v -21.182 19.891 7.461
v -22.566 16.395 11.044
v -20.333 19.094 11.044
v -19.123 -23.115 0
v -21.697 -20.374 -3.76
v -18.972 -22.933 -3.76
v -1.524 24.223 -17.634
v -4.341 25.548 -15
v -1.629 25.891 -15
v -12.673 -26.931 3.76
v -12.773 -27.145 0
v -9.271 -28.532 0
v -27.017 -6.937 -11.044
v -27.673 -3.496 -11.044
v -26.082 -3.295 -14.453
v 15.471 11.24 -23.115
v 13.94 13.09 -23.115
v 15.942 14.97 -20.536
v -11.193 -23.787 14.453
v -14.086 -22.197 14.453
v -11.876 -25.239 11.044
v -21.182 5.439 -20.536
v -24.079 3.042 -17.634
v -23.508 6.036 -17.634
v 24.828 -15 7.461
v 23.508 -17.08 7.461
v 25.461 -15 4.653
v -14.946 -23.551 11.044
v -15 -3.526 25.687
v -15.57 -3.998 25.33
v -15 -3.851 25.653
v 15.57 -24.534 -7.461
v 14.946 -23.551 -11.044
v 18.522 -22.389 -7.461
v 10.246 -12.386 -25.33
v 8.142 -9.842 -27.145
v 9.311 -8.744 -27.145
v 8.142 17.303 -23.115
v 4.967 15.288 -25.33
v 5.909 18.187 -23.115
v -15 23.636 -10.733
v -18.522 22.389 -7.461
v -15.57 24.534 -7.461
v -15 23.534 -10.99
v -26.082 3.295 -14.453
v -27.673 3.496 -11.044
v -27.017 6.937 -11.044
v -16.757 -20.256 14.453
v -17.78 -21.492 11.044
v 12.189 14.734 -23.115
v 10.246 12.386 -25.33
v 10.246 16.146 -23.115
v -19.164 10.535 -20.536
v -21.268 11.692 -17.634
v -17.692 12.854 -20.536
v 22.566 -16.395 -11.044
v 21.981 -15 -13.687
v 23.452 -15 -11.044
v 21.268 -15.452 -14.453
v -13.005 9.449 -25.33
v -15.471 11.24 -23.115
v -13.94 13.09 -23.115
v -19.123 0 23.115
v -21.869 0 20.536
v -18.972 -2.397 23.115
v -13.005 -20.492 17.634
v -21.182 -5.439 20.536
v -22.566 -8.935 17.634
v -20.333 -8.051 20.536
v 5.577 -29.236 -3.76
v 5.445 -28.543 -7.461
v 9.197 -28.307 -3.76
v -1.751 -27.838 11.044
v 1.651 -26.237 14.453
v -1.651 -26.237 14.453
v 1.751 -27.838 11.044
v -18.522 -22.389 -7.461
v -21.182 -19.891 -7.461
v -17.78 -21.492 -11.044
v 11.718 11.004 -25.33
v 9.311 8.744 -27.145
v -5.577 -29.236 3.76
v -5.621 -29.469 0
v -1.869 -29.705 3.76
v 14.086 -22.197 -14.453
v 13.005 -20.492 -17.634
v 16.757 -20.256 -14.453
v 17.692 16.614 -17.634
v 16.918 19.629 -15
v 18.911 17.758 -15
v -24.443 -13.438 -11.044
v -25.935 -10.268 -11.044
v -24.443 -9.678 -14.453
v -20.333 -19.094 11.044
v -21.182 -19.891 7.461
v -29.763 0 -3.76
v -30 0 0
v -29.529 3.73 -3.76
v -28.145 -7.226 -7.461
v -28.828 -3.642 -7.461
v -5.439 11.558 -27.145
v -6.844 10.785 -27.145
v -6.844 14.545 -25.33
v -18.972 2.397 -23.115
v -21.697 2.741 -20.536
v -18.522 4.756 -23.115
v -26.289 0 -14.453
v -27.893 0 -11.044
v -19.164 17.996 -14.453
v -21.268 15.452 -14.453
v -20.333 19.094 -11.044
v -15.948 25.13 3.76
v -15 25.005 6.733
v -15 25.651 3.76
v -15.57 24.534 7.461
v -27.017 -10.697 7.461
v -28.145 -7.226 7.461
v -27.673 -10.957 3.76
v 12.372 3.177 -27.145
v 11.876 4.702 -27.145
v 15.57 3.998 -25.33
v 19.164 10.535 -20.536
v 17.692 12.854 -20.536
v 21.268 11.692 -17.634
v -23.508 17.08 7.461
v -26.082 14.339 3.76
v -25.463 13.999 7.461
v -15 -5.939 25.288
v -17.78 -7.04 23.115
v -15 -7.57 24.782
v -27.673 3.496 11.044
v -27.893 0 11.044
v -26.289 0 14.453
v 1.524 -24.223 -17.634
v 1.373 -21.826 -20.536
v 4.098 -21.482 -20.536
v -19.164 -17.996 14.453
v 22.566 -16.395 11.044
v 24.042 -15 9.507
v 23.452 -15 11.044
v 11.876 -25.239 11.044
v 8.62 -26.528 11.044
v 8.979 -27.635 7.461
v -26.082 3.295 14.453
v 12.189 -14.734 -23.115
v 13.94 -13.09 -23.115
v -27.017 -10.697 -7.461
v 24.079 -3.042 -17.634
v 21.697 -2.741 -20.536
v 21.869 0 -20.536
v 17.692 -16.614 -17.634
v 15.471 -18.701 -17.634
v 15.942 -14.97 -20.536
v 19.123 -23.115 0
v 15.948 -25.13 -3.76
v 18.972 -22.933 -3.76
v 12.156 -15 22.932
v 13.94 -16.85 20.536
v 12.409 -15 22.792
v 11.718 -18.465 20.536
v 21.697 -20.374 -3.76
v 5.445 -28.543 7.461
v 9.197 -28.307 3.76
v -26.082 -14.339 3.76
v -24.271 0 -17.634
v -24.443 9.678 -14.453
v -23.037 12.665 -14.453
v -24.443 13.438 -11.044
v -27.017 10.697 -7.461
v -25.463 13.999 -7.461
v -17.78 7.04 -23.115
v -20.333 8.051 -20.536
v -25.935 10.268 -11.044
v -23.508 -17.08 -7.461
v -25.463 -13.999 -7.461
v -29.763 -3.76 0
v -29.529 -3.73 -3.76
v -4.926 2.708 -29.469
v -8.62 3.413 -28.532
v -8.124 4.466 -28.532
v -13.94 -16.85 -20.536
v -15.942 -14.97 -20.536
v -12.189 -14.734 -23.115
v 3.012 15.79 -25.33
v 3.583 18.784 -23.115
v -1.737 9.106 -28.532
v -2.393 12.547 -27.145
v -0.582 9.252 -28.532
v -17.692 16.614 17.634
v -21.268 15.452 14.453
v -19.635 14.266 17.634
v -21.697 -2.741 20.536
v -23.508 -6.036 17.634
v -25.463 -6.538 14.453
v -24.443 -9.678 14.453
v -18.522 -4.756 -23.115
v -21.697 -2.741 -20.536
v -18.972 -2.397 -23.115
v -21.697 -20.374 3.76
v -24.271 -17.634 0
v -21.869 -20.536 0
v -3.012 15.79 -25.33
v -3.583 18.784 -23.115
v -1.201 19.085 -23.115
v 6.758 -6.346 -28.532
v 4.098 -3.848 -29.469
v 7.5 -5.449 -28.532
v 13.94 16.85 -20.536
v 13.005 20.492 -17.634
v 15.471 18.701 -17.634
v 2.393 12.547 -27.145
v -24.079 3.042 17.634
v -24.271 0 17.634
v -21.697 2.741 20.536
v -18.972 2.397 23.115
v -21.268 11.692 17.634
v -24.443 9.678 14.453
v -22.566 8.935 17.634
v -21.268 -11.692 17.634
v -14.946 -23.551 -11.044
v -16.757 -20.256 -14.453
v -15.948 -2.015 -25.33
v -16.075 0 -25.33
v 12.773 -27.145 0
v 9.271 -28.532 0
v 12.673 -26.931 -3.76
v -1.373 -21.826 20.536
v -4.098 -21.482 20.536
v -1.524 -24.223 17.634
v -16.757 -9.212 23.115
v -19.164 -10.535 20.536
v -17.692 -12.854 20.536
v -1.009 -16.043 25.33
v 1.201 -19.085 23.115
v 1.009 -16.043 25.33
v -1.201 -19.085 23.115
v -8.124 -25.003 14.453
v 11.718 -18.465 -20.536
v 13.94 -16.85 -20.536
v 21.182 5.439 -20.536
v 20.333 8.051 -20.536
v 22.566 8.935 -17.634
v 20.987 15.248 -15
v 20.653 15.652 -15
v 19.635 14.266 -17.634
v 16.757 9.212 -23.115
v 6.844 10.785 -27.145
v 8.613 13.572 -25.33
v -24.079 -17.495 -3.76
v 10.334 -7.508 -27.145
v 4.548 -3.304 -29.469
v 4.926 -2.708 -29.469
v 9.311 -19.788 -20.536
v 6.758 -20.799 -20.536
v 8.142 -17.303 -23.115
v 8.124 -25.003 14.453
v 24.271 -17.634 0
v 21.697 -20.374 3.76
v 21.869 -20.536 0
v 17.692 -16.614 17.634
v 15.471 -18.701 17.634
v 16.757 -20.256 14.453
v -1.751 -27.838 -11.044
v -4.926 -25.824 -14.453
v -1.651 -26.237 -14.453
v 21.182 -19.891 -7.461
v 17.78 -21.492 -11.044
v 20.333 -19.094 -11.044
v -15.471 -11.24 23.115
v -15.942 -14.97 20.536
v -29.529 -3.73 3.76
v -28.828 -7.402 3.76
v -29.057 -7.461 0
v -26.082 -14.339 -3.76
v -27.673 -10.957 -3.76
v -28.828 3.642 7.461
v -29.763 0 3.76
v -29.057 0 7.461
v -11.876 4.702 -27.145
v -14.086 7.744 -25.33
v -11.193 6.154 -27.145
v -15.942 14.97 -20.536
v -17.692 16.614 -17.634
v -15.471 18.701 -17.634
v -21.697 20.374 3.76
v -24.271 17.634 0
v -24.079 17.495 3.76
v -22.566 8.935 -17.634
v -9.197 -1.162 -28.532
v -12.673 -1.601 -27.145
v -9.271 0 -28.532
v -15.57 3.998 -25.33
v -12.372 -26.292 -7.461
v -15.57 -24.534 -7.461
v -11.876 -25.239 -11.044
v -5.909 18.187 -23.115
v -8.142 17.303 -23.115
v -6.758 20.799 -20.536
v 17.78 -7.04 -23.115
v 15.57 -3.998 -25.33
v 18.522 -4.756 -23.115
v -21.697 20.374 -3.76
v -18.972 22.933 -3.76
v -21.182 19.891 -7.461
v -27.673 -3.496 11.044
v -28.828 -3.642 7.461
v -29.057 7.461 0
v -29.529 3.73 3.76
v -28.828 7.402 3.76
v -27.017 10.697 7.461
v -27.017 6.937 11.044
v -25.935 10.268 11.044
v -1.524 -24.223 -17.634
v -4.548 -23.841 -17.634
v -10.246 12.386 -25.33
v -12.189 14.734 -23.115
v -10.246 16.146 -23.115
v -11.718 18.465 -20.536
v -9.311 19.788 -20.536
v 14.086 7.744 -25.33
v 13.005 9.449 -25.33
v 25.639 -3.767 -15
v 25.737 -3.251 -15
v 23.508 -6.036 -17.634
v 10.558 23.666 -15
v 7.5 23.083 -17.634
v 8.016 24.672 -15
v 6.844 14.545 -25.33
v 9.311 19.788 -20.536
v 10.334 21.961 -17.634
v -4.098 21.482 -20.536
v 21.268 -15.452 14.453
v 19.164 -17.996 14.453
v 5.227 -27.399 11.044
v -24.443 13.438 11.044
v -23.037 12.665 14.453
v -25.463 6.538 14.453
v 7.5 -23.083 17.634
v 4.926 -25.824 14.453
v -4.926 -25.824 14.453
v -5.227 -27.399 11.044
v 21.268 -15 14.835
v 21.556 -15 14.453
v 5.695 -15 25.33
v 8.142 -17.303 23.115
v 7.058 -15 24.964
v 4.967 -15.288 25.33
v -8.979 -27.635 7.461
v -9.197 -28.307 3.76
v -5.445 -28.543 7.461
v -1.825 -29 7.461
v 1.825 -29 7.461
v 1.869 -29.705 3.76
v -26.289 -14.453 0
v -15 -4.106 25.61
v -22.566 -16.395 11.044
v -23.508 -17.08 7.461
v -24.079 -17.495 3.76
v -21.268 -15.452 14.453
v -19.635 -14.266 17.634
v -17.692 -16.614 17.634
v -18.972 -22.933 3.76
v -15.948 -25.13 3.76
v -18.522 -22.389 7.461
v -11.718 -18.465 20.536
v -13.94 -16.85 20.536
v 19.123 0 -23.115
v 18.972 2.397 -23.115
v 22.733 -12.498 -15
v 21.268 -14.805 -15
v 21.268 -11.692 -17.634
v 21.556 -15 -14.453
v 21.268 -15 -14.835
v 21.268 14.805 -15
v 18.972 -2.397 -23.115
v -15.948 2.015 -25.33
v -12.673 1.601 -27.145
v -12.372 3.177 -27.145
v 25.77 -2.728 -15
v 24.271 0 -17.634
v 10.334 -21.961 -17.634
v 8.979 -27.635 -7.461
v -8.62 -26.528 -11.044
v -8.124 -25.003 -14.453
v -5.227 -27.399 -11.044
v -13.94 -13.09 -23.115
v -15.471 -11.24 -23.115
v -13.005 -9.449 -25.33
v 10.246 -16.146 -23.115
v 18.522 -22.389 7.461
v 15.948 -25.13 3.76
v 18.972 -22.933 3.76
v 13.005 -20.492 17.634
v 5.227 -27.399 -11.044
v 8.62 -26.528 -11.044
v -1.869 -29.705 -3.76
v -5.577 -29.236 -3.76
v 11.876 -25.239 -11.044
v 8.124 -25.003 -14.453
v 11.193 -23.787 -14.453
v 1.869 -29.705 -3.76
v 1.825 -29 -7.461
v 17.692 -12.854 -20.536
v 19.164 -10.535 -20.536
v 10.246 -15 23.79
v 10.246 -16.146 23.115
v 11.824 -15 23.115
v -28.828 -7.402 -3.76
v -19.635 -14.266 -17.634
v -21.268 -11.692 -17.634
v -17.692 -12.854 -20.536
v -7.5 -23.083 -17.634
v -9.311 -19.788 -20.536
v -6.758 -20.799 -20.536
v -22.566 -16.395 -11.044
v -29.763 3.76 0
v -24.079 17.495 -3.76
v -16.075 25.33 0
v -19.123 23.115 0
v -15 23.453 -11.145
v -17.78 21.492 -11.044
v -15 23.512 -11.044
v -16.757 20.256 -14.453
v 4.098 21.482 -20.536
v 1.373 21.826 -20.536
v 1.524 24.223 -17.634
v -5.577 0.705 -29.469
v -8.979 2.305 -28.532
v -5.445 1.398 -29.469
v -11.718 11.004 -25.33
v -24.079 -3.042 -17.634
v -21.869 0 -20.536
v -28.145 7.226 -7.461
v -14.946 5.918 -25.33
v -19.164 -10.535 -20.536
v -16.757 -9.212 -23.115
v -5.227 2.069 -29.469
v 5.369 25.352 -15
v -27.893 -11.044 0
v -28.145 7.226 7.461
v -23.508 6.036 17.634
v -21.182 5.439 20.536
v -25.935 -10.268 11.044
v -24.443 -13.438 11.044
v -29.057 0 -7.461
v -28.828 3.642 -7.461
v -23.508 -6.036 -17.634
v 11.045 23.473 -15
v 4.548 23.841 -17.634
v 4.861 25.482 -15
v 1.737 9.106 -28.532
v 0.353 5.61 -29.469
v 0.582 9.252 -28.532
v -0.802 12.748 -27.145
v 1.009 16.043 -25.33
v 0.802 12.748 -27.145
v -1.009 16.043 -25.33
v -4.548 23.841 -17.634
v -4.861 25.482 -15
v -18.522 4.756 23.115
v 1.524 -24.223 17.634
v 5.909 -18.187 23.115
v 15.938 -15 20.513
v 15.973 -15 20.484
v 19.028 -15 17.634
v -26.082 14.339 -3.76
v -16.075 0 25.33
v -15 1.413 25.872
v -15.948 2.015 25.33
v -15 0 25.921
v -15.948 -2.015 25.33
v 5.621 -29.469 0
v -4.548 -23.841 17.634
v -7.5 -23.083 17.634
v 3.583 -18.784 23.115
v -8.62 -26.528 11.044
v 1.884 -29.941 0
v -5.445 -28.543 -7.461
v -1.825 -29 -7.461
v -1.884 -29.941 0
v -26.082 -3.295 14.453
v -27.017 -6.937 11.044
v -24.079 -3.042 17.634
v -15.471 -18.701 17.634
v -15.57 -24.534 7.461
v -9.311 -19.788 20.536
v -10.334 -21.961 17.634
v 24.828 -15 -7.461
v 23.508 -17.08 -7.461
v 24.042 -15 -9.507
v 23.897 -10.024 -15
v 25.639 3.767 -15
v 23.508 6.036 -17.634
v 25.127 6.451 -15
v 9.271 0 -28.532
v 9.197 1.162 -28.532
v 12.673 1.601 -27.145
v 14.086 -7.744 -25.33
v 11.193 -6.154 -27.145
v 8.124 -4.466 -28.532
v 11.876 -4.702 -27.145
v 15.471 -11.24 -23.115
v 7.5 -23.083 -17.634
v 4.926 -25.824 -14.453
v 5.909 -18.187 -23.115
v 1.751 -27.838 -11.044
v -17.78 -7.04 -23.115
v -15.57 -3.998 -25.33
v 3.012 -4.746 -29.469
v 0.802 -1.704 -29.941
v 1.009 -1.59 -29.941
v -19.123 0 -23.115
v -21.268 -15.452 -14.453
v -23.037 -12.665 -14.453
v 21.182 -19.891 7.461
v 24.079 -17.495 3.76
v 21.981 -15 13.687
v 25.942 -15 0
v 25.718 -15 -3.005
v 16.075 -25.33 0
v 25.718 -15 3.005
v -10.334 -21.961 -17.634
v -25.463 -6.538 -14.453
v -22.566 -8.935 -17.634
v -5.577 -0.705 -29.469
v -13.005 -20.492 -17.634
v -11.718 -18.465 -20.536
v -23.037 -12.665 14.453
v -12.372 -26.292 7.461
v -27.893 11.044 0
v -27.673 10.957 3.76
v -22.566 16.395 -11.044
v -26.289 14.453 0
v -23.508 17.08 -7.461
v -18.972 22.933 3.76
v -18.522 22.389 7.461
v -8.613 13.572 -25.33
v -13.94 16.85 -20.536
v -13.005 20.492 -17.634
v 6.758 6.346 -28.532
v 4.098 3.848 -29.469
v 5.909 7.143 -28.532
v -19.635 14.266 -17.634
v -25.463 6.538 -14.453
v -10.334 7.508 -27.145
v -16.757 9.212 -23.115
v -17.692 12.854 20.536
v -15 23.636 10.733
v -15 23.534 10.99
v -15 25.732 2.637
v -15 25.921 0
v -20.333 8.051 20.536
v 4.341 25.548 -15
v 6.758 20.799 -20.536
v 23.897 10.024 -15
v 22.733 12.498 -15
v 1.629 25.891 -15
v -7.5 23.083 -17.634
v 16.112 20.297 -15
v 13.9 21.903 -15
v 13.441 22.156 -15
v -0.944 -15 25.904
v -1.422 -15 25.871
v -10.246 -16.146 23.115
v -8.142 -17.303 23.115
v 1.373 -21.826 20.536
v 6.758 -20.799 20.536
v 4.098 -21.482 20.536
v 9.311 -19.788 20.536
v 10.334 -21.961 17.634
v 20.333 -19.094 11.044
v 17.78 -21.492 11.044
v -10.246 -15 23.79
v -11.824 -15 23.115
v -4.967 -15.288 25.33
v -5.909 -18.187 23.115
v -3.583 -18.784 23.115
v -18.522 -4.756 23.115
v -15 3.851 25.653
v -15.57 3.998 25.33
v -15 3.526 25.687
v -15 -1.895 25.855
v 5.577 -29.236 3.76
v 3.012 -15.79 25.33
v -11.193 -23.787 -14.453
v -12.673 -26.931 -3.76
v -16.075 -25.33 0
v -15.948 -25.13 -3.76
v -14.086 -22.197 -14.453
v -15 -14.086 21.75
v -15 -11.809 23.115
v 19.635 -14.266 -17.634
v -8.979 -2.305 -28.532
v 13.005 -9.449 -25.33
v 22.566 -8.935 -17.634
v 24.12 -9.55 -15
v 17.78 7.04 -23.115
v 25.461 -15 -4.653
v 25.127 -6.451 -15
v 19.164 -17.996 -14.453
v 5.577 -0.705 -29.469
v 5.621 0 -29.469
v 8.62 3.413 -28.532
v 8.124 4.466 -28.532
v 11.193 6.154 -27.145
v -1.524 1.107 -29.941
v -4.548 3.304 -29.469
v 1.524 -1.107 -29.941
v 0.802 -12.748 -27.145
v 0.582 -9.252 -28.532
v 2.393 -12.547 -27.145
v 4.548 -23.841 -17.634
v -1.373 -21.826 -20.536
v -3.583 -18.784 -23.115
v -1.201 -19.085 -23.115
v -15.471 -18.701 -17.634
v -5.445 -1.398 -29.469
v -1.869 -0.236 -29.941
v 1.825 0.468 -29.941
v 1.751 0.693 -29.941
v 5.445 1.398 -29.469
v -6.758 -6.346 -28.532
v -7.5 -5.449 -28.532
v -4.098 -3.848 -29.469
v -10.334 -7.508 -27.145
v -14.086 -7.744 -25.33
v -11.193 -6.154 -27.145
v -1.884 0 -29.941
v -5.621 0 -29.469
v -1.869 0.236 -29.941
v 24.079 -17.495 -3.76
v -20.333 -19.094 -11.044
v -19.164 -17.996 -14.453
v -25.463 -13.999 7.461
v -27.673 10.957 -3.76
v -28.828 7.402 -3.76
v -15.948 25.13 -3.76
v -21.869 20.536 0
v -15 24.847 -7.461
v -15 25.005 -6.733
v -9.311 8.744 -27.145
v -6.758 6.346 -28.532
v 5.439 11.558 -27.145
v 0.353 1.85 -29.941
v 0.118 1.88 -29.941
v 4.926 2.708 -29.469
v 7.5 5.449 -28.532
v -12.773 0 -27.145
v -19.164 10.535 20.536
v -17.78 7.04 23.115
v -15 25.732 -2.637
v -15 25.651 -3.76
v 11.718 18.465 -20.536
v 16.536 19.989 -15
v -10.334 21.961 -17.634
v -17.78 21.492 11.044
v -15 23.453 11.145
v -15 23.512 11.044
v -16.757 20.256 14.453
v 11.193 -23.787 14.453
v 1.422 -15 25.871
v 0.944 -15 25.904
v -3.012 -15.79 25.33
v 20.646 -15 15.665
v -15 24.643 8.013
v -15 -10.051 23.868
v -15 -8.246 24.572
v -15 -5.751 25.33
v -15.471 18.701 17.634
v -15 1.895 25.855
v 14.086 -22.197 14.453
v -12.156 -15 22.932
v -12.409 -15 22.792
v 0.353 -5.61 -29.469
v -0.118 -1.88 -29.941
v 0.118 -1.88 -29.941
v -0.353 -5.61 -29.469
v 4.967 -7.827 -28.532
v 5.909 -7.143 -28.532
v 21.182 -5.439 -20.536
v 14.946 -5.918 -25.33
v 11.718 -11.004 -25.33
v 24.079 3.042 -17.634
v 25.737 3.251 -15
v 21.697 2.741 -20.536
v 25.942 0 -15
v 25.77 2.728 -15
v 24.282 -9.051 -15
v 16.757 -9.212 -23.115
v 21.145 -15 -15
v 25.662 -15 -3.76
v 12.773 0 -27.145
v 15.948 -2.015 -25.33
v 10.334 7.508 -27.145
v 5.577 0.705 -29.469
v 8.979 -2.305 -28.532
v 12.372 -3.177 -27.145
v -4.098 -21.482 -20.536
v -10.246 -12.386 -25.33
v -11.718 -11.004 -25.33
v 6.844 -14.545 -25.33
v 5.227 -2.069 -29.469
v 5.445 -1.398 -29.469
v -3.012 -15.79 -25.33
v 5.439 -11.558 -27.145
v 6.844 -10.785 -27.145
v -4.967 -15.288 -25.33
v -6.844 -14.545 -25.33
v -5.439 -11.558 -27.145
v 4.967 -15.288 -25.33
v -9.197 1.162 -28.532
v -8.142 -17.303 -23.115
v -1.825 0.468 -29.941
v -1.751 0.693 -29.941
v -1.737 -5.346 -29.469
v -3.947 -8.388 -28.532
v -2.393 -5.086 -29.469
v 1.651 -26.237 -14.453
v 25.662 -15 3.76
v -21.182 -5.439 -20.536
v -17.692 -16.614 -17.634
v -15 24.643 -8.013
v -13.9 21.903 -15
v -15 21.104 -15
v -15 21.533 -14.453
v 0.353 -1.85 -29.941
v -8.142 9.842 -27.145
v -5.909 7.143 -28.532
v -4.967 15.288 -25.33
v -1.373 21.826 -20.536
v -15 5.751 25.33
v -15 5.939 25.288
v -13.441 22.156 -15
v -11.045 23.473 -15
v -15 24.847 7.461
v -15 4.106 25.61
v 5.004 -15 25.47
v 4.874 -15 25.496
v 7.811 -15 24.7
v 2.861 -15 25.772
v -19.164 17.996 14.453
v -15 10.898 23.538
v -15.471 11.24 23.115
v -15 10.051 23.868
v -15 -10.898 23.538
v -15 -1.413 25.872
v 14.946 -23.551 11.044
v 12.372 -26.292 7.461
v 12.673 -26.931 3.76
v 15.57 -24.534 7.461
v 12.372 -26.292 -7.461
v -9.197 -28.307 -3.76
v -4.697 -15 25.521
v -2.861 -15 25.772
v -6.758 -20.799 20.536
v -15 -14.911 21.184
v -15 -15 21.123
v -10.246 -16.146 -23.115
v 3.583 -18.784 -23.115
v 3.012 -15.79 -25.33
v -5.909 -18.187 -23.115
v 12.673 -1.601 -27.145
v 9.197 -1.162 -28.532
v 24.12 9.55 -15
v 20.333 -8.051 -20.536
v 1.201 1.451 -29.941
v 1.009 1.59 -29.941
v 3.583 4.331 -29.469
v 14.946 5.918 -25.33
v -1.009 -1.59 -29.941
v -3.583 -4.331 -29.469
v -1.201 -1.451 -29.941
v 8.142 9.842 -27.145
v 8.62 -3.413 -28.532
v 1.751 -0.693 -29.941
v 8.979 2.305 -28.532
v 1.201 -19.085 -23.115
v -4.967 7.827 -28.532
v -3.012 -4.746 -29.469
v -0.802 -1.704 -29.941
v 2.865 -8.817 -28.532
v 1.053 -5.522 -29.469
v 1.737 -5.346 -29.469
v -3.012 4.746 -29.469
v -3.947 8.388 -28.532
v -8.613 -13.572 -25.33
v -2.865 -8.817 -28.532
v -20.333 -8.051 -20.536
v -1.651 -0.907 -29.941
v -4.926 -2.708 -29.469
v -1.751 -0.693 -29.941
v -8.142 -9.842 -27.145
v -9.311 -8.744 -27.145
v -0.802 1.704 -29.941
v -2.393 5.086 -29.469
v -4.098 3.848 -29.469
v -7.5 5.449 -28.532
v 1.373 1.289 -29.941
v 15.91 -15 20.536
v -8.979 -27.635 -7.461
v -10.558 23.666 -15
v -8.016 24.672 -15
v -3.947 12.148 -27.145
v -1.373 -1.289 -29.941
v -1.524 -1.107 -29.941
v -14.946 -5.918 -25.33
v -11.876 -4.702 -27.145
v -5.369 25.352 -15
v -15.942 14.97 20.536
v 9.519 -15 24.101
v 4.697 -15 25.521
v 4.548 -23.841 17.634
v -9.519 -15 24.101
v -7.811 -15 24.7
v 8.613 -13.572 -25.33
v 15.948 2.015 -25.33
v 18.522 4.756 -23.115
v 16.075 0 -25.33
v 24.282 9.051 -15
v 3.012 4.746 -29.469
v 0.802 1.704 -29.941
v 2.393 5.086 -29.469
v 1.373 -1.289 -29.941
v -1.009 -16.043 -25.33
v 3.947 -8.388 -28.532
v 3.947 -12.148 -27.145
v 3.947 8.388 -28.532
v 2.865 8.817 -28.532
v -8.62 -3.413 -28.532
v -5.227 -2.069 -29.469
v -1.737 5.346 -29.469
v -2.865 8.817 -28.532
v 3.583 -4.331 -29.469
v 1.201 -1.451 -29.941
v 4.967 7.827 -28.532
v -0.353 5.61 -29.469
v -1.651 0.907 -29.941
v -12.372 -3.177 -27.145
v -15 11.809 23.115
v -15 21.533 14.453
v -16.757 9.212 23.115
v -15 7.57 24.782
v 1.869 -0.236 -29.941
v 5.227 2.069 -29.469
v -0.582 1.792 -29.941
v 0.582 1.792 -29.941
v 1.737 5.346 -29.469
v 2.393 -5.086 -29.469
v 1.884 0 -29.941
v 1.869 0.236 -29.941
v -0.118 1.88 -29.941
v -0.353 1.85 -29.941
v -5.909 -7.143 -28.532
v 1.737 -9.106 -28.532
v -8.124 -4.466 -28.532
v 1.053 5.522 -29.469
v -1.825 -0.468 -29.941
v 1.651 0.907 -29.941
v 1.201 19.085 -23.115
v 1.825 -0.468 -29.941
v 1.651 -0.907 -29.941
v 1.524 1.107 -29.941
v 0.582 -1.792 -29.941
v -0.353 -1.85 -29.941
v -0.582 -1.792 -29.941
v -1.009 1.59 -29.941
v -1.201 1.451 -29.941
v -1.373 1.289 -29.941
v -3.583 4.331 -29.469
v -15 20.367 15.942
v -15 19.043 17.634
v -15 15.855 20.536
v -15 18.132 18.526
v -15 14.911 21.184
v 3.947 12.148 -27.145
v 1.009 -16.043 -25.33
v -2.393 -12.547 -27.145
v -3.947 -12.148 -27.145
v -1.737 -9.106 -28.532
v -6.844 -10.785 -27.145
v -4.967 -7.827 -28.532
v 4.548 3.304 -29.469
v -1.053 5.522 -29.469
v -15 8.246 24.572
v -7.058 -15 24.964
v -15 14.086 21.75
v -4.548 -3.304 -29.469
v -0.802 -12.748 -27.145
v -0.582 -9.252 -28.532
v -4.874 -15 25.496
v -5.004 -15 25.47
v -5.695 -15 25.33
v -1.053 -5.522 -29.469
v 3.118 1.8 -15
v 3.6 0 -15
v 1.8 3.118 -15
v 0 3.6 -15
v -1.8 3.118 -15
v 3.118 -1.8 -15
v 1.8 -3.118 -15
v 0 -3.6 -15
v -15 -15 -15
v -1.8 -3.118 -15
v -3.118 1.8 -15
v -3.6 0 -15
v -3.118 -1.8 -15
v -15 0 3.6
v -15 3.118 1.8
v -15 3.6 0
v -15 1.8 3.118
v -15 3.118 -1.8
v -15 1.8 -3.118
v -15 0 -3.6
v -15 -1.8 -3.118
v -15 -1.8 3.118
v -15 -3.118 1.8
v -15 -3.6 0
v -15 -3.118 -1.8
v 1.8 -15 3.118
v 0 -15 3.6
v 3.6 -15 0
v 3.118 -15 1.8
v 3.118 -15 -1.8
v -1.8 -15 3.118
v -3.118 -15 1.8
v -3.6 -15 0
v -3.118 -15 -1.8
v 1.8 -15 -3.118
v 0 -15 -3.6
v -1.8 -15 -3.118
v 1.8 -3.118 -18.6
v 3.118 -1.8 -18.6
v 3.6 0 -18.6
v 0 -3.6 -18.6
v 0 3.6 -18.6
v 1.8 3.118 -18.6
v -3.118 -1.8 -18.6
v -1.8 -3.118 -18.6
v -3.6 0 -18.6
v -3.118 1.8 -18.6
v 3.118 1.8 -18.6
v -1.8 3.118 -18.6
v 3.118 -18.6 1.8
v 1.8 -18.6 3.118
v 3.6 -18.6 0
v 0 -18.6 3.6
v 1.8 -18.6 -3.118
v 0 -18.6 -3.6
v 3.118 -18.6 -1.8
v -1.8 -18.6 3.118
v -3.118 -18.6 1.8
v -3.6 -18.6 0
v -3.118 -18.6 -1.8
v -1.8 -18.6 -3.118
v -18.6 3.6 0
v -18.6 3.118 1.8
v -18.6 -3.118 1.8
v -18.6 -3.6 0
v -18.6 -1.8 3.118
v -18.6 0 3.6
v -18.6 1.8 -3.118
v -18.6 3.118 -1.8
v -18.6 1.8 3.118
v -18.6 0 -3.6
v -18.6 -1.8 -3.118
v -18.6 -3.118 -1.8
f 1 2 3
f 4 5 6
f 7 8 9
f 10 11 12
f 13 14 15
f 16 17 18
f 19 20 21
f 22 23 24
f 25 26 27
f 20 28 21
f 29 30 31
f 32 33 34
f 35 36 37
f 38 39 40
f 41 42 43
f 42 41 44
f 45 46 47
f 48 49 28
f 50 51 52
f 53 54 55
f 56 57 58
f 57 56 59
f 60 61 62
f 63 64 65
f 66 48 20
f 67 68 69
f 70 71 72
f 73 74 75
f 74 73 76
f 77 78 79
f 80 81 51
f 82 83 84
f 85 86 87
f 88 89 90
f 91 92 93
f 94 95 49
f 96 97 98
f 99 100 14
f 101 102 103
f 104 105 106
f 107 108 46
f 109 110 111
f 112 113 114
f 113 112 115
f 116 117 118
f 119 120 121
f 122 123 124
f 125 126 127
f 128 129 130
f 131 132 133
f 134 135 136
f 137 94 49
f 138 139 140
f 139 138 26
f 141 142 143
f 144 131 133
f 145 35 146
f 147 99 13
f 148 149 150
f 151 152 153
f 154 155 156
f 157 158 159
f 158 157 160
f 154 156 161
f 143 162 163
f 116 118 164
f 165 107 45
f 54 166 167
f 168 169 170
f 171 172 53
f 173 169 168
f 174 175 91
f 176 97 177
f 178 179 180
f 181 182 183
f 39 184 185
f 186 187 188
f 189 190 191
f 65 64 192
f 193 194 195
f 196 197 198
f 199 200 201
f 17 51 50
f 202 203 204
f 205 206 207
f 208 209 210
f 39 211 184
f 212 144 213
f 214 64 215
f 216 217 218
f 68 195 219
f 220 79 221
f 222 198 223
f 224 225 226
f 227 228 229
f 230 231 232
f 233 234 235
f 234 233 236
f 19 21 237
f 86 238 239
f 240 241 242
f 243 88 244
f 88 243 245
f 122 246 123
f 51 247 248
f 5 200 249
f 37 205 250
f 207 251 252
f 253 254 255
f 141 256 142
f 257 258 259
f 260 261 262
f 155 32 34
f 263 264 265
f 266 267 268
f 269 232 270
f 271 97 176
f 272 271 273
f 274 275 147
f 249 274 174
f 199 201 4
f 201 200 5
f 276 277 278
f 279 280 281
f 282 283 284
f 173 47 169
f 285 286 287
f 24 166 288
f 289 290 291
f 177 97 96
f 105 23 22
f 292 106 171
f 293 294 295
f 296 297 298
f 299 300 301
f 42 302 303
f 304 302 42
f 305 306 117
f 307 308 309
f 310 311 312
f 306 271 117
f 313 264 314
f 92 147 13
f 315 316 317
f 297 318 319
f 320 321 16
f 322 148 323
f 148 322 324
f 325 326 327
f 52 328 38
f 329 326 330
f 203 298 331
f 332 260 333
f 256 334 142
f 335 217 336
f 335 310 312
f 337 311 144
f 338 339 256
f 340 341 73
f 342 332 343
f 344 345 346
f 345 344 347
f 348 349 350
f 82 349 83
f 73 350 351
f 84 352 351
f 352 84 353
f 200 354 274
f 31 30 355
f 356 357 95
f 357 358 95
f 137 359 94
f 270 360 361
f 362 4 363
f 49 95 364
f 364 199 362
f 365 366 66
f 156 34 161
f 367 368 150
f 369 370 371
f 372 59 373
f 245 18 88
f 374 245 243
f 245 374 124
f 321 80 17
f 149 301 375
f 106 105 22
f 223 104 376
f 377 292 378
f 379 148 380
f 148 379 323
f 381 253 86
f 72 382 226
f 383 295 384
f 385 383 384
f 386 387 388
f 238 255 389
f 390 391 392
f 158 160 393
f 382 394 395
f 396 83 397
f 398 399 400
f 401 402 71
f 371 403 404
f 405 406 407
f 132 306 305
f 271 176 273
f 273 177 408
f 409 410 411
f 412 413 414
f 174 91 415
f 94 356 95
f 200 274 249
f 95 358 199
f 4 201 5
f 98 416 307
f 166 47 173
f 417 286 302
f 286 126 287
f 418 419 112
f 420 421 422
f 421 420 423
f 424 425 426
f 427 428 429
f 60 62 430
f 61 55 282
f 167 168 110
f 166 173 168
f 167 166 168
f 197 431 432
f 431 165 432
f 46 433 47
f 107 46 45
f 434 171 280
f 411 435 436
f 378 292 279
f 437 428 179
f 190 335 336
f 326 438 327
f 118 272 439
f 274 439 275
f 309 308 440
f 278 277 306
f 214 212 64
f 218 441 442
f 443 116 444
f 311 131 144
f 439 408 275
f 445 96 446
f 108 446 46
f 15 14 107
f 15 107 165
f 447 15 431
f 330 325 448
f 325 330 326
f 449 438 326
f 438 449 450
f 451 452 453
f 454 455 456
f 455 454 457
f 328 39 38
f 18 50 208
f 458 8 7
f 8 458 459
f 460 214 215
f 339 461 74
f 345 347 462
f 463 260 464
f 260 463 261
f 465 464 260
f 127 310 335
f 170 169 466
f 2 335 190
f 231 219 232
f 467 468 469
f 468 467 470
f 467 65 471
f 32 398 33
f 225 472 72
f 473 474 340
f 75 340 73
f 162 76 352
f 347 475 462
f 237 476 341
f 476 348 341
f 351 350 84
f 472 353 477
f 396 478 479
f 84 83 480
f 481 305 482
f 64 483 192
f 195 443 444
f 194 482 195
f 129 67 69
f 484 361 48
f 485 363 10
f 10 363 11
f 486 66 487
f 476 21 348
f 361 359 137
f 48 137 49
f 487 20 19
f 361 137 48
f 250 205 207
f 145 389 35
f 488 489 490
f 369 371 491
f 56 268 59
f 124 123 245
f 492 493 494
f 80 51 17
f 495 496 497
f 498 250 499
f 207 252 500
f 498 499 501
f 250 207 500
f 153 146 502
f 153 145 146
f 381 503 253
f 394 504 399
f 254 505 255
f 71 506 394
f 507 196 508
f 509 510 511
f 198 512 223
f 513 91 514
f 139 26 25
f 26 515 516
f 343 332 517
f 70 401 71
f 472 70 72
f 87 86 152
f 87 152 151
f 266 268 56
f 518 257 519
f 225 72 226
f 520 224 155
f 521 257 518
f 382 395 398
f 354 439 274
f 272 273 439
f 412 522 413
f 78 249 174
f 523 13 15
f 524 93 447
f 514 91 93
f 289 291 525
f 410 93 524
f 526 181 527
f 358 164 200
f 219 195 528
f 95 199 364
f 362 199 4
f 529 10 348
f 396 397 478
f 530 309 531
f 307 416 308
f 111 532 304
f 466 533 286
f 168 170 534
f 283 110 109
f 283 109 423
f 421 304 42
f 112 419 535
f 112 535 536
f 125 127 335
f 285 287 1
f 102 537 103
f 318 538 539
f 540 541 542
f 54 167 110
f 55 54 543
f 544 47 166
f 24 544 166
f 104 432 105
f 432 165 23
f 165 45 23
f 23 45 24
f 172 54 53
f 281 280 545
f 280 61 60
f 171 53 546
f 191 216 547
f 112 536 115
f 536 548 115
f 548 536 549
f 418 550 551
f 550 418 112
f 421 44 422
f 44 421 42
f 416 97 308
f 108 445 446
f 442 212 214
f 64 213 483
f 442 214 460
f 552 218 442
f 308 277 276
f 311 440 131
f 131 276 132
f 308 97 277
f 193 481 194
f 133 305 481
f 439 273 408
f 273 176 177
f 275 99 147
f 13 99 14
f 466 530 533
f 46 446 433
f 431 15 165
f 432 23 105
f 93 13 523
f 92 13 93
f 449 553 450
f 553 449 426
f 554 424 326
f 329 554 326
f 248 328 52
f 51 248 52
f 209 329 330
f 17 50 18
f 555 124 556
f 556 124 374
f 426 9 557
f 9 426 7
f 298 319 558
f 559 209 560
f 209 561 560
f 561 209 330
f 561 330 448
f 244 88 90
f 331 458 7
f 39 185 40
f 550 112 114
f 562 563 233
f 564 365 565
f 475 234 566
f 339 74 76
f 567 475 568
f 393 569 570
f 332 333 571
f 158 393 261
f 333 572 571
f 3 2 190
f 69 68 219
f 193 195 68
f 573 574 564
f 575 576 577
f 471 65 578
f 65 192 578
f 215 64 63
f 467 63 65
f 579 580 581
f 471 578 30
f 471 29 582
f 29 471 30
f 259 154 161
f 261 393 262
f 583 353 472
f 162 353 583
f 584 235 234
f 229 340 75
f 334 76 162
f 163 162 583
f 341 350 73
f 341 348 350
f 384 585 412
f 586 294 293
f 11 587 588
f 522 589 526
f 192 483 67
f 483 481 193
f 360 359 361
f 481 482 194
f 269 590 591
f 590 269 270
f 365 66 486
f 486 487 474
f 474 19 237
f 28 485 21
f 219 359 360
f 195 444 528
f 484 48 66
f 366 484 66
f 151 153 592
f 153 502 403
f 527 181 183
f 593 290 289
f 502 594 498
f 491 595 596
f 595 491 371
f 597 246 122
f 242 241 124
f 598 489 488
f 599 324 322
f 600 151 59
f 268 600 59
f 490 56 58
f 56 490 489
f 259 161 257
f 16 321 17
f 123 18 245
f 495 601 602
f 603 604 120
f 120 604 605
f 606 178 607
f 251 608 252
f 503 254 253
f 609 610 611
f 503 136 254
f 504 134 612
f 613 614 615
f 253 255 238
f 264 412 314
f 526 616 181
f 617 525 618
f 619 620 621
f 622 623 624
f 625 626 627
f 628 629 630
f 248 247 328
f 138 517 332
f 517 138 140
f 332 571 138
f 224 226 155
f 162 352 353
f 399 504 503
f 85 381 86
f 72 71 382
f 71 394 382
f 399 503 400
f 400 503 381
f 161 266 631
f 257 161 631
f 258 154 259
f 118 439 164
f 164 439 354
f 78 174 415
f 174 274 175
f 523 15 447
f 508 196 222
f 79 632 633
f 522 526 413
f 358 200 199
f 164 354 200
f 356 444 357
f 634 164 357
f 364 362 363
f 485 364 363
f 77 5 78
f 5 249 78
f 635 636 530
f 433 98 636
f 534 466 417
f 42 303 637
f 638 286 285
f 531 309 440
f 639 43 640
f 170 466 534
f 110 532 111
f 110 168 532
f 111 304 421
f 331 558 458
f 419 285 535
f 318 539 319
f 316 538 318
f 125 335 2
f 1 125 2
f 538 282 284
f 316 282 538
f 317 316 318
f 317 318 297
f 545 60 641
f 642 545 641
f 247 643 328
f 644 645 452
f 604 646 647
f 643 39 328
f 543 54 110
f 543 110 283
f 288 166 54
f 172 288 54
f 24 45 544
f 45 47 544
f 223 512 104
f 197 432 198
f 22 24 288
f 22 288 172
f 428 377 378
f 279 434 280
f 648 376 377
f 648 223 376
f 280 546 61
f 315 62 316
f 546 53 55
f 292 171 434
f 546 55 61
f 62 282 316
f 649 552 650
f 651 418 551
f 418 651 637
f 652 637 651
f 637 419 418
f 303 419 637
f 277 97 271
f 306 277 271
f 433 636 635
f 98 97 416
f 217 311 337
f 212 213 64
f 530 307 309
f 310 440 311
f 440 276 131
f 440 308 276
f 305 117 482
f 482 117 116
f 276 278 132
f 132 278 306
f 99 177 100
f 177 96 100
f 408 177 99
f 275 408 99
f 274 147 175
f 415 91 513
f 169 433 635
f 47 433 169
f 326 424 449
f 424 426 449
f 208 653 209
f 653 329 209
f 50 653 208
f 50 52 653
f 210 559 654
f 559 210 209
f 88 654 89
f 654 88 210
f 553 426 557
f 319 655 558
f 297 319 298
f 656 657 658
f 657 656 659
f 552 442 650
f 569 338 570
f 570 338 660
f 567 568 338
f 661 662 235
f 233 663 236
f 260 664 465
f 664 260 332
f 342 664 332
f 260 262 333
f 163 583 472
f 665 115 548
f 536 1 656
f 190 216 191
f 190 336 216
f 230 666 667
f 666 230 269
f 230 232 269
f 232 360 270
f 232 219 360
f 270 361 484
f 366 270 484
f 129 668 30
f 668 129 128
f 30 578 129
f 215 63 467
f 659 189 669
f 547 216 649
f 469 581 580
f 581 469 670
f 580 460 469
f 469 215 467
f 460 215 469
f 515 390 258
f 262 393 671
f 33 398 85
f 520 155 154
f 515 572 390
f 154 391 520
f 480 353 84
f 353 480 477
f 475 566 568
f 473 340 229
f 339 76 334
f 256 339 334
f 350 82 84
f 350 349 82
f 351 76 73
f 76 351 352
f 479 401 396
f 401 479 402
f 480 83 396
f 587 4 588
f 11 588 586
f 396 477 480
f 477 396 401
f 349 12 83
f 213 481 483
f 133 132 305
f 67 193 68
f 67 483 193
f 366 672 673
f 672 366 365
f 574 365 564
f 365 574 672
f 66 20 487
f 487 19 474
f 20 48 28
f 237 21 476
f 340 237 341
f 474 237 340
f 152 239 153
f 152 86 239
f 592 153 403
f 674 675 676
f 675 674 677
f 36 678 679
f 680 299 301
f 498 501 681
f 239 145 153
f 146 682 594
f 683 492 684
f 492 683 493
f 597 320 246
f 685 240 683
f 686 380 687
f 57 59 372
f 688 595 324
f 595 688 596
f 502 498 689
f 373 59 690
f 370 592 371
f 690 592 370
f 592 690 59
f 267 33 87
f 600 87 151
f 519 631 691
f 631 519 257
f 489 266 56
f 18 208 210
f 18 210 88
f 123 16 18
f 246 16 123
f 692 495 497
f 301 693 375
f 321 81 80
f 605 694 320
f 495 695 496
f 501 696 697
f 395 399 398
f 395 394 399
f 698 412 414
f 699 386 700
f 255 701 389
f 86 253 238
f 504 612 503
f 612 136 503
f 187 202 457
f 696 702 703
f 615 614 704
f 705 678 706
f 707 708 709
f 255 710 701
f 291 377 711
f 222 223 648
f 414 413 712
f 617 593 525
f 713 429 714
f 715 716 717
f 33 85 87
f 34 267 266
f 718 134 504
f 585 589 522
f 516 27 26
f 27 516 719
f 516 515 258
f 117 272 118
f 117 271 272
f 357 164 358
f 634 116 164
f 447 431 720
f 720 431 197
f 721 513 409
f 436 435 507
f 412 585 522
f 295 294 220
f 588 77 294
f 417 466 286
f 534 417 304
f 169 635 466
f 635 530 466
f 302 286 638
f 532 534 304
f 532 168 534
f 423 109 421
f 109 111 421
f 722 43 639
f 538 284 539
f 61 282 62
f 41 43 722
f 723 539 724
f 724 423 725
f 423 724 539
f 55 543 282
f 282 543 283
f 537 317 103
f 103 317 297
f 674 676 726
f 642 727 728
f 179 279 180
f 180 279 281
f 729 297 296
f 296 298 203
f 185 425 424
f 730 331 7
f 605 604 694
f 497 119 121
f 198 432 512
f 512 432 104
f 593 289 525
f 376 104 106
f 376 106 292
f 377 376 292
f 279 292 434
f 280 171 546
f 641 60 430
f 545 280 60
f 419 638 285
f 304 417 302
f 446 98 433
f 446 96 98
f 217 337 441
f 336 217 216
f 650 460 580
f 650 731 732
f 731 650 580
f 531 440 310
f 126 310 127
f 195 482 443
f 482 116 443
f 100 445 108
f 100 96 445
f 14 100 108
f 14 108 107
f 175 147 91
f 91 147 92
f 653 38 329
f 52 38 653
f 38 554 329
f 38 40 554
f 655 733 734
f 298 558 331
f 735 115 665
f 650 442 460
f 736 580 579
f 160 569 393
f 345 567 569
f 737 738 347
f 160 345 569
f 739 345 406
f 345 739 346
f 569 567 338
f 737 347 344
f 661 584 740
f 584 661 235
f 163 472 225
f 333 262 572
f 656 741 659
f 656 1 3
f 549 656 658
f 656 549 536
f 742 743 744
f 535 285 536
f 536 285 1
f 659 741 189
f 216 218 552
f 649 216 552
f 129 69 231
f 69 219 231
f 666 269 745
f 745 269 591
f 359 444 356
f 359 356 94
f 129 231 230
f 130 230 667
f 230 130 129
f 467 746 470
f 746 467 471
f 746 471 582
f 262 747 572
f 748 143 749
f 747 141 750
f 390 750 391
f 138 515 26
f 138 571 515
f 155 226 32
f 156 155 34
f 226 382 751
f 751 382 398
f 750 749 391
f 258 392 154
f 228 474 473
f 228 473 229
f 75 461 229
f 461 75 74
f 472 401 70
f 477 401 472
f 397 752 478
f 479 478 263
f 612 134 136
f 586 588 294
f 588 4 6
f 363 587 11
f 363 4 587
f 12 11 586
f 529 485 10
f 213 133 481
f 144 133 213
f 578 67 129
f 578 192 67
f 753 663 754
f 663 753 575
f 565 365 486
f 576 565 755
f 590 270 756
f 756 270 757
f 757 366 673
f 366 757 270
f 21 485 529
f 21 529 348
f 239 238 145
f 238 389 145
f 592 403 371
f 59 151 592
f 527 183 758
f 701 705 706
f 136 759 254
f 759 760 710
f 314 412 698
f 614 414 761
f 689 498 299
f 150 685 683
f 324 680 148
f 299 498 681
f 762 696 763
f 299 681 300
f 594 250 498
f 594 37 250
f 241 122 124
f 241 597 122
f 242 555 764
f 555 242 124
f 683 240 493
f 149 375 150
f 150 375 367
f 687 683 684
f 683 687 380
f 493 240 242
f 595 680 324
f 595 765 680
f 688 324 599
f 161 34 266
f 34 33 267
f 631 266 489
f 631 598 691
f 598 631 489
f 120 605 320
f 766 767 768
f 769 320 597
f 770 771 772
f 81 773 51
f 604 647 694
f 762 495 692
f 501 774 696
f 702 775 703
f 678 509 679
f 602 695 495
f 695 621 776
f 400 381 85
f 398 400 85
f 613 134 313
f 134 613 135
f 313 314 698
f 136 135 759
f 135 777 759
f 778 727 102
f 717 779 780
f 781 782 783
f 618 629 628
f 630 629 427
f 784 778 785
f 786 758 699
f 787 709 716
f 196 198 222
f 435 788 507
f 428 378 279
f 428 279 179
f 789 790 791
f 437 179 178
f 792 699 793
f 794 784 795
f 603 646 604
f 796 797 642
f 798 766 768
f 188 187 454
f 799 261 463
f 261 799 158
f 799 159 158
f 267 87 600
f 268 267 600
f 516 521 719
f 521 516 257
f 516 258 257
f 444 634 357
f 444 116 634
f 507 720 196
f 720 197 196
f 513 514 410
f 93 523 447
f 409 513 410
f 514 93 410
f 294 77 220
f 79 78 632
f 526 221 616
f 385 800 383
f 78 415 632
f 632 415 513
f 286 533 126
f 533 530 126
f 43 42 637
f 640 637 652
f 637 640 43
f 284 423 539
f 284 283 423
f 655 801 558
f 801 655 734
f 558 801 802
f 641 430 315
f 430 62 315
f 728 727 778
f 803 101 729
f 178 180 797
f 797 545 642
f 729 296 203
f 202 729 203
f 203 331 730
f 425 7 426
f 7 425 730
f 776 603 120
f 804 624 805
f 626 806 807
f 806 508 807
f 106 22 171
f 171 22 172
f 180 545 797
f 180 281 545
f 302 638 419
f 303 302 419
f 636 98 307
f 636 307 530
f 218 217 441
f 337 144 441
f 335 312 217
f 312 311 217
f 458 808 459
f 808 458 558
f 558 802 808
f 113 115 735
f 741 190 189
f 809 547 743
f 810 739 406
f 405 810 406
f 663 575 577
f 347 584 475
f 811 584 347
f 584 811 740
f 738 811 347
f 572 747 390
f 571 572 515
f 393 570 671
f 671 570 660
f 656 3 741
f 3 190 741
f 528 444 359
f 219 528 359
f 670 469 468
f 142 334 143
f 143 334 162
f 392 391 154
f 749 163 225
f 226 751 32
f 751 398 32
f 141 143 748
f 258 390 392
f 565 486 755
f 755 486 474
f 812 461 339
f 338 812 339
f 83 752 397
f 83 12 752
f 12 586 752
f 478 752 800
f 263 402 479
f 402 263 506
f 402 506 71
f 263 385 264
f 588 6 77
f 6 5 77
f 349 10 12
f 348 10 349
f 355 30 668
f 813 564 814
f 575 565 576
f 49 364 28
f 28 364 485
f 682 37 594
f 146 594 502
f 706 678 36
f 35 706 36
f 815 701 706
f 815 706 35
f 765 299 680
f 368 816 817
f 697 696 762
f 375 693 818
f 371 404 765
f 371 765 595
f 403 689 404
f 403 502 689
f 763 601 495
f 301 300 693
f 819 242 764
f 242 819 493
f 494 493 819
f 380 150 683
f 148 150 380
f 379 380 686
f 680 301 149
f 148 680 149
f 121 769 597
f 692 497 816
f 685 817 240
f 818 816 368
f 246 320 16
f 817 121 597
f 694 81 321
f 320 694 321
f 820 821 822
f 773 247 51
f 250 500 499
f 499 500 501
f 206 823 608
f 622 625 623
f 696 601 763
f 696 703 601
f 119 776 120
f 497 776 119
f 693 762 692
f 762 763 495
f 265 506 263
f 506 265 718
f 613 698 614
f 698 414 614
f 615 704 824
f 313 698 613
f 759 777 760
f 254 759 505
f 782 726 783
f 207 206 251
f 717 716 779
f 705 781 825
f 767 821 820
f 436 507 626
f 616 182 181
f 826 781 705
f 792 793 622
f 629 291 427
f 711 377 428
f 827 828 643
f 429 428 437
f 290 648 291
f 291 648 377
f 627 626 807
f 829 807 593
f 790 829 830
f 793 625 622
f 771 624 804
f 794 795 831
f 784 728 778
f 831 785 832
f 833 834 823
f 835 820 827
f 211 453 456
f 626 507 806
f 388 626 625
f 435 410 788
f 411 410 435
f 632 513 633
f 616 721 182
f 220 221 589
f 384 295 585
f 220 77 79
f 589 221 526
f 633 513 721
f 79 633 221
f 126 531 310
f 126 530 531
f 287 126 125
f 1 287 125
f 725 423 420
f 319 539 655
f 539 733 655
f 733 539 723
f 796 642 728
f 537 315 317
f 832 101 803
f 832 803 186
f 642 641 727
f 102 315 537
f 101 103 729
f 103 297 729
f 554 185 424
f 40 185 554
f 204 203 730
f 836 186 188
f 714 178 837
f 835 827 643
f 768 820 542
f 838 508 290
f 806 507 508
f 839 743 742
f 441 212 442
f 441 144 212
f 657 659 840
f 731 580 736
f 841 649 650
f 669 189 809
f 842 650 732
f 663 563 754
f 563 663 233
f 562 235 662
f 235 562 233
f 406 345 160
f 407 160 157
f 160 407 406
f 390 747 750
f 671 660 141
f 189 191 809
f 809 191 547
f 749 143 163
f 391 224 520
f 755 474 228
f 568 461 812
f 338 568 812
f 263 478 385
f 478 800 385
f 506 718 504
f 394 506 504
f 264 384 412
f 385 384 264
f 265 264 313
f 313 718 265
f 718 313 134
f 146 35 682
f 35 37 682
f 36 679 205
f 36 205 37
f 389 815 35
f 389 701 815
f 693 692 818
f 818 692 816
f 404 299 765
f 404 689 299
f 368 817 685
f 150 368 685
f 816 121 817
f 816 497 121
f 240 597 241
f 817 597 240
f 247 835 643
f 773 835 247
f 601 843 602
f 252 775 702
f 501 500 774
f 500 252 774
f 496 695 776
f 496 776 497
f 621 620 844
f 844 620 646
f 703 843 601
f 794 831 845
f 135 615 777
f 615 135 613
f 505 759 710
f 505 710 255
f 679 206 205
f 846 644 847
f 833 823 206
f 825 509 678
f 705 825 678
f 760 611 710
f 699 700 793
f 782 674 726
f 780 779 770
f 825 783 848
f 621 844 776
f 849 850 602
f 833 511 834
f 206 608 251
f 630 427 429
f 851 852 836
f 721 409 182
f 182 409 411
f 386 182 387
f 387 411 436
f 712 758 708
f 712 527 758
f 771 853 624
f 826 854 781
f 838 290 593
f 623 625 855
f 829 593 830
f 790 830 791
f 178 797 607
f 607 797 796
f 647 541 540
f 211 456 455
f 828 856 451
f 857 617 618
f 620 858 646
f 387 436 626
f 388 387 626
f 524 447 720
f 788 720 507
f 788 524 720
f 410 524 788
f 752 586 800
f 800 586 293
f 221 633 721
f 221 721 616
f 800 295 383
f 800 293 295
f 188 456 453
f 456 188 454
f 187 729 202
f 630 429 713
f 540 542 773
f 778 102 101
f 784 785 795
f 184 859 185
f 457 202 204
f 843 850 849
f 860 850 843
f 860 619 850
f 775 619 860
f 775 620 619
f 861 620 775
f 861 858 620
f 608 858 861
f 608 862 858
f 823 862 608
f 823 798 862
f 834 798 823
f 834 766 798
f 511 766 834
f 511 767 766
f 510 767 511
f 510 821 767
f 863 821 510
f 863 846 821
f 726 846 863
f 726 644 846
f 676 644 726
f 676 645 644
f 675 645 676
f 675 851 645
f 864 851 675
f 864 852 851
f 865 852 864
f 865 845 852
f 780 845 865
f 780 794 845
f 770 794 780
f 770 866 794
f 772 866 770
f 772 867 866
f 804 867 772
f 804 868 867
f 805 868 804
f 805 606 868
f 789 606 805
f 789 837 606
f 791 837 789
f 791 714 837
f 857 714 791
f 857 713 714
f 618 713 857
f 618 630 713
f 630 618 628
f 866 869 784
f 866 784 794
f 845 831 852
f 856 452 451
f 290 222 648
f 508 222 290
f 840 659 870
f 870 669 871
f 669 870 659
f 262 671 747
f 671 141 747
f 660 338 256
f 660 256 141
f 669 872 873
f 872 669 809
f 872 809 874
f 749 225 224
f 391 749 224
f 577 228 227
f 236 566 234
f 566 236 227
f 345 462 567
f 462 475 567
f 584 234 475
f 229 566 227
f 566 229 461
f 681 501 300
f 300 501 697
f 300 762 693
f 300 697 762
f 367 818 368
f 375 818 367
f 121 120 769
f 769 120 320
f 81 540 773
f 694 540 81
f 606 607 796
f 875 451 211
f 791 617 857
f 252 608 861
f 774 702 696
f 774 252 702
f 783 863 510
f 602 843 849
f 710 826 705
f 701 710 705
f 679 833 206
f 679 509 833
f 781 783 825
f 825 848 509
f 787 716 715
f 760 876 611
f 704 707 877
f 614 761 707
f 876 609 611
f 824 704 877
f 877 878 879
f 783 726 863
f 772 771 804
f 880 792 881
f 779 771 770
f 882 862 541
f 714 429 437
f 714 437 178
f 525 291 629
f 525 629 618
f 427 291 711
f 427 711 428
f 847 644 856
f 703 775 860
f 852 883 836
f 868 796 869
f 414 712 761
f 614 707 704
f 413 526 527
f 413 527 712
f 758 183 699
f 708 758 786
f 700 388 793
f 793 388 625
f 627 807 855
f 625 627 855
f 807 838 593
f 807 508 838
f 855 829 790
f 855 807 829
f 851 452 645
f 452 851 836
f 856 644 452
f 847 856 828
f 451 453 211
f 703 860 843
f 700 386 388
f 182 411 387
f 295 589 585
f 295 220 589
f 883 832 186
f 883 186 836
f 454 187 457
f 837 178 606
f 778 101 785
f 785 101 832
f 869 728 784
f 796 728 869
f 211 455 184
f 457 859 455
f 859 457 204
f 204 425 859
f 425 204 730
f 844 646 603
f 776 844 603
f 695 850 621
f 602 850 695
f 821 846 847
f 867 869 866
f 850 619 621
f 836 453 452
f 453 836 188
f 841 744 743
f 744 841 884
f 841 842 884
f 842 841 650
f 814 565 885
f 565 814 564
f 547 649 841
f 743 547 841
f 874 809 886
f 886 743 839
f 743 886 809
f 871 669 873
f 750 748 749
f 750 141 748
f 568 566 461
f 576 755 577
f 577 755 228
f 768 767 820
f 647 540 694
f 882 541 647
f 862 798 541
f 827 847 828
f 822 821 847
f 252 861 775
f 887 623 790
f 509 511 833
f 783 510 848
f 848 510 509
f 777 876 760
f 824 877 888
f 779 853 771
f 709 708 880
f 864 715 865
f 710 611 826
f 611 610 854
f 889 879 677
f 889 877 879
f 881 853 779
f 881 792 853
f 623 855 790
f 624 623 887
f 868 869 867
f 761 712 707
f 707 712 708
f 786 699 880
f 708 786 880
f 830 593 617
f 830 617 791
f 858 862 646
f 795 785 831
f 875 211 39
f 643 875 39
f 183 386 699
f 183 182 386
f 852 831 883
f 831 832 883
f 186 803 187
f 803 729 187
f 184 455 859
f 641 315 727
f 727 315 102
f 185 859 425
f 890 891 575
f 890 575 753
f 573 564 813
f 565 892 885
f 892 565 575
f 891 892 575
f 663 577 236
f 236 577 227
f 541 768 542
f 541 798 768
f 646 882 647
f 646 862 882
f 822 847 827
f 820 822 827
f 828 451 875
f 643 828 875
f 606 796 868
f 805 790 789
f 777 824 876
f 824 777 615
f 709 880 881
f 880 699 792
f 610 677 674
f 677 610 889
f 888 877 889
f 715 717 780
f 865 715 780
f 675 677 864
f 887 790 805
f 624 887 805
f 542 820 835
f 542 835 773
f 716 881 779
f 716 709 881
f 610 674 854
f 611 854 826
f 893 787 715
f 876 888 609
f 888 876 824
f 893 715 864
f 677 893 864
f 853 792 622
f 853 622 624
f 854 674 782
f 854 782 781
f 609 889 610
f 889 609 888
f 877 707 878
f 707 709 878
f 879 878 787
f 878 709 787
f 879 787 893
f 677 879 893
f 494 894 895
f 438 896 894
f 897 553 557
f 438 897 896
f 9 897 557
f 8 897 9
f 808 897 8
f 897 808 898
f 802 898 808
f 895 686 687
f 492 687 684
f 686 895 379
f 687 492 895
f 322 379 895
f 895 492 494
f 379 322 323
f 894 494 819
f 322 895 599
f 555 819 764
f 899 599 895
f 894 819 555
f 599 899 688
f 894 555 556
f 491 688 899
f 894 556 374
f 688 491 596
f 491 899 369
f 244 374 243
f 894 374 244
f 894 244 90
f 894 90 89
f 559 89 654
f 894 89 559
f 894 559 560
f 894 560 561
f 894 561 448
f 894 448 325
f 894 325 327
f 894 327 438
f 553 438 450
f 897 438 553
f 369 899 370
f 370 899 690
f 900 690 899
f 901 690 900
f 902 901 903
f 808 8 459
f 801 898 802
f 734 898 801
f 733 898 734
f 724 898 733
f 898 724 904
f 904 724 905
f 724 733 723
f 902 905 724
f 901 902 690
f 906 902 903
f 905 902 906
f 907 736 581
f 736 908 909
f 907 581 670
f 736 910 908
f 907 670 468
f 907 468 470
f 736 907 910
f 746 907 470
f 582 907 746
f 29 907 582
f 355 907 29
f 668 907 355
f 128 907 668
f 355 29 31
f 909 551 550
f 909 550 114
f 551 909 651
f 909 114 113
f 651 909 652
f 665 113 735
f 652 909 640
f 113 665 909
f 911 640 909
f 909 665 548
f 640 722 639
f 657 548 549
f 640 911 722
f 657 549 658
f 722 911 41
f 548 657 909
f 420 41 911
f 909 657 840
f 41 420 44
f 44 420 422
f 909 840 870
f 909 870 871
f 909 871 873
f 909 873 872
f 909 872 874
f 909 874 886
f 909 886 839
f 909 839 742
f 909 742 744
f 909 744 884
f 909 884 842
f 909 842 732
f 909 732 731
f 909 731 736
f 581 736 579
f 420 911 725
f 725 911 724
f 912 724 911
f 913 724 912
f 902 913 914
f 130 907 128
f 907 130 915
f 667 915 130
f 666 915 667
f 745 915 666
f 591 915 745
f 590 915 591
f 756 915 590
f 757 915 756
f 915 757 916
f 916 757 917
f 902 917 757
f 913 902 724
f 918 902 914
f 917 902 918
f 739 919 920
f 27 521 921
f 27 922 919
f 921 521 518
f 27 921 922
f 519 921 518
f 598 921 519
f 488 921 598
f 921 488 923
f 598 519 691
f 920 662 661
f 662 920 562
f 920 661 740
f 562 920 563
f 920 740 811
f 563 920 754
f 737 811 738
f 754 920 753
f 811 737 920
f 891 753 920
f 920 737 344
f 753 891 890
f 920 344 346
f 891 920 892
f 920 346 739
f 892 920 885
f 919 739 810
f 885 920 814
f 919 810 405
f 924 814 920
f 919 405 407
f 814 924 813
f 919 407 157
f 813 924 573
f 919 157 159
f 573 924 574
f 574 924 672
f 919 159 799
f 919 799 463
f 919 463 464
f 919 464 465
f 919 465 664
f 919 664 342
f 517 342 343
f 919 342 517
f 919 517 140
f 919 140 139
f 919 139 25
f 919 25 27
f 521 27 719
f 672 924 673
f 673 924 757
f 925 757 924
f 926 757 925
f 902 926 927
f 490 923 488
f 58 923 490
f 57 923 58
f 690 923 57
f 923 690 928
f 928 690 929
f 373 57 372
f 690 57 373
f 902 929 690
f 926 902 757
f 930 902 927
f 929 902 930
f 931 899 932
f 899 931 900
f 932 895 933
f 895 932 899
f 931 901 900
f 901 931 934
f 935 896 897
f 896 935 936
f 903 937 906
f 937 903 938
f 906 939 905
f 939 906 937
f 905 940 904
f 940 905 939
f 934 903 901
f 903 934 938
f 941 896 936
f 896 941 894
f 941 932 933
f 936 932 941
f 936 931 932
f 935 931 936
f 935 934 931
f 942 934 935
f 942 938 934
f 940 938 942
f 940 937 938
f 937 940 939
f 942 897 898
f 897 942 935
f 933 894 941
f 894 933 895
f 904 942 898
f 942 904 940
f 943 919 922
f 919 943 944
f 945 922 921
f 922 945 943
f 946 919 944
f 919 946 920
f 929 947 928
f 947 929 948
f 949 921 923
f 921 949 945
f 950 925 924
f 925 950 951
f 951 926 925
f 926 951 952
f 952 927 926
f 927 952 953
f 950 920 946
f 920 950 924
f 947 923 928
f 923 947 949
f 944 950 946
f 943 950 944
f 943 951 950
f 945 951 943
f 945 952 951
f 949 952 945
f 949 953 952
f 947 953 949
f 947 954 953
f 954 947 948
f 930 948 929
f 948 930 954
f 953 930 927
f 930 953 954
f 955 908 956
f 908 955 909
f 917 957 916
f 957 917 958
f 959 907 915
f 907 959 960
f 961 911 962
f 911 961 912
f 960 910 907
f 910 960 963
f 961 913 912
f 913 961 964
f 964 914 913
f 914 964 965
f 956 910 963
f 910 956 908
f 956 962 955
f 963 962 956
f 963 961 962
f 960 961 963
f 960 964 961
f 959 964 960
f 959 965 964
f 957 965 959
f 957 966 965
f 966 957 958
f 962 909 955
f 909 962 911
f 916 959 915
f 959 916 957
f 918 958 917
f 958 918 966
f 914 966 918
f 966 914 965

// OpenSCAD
sphere_radius = 30;
mag_dia = 6;
mag_height = 3;

clearance = 1.2;

radius = mag_dia * clearance / 2;
height = mag_height * clearance;
trans = sphere_radius/2*(-1);

difference() {
    sphere(sphere_radius,$fn=50);
    translate ([trans,trans,trans])cube(sphere_radius*2);

    translate ([0,0,trans]) rotate([180,0,0]) cylinder(height,radius,radius);
    translate ([0,trans,0]) rotate([90,0,0]) cylinder(height,radius,radius);
    translate ([trans,0,0]) rotate([0,270,0]) cylinder(height,radius,radius);
}
